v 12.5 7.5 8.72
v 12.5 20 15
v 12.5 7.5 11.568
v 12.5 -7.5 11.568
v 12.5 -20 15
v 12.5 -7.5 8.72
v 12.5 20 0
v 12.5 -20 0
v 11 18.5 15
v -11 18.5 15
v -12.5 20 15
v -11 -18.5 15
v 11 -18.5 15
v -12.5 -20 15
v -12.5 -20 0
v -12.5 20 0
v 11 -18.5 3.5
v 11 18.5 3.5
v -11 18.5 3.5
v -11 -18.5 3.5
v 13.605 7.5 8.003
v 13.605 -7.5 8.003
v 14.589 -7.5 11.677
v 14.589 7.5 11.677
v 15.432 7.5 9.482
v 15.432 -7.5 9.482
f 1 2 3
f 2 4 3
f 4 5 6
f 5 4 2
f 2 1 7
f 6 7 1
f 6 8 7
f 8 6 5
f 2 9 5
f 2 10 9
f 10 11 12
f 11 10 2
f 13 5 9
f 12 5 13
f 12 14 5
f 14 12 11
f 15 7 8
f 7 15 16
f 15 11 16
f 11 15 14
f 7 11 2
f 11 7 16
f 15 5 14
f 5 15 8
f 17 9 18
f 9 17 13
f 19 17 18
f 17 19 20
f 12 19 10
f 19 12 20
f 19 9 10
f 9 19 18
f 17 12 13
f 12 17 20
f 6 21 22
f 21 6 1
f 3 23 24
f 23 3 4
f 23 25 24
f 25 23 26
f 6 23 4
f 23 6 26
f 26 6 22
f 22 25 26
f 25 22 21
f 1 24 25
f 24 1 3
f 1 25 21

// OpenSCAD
module drawer(){difference(){cube([25,40,15],center=true);translate([0,0,2])cube([22,37,12],center=true);}}
translate([0,0,7.5])drawer();

translate([13.5,7.5,10])rotate([90,15,0])cylinder(15,2,2,$fn=5);
